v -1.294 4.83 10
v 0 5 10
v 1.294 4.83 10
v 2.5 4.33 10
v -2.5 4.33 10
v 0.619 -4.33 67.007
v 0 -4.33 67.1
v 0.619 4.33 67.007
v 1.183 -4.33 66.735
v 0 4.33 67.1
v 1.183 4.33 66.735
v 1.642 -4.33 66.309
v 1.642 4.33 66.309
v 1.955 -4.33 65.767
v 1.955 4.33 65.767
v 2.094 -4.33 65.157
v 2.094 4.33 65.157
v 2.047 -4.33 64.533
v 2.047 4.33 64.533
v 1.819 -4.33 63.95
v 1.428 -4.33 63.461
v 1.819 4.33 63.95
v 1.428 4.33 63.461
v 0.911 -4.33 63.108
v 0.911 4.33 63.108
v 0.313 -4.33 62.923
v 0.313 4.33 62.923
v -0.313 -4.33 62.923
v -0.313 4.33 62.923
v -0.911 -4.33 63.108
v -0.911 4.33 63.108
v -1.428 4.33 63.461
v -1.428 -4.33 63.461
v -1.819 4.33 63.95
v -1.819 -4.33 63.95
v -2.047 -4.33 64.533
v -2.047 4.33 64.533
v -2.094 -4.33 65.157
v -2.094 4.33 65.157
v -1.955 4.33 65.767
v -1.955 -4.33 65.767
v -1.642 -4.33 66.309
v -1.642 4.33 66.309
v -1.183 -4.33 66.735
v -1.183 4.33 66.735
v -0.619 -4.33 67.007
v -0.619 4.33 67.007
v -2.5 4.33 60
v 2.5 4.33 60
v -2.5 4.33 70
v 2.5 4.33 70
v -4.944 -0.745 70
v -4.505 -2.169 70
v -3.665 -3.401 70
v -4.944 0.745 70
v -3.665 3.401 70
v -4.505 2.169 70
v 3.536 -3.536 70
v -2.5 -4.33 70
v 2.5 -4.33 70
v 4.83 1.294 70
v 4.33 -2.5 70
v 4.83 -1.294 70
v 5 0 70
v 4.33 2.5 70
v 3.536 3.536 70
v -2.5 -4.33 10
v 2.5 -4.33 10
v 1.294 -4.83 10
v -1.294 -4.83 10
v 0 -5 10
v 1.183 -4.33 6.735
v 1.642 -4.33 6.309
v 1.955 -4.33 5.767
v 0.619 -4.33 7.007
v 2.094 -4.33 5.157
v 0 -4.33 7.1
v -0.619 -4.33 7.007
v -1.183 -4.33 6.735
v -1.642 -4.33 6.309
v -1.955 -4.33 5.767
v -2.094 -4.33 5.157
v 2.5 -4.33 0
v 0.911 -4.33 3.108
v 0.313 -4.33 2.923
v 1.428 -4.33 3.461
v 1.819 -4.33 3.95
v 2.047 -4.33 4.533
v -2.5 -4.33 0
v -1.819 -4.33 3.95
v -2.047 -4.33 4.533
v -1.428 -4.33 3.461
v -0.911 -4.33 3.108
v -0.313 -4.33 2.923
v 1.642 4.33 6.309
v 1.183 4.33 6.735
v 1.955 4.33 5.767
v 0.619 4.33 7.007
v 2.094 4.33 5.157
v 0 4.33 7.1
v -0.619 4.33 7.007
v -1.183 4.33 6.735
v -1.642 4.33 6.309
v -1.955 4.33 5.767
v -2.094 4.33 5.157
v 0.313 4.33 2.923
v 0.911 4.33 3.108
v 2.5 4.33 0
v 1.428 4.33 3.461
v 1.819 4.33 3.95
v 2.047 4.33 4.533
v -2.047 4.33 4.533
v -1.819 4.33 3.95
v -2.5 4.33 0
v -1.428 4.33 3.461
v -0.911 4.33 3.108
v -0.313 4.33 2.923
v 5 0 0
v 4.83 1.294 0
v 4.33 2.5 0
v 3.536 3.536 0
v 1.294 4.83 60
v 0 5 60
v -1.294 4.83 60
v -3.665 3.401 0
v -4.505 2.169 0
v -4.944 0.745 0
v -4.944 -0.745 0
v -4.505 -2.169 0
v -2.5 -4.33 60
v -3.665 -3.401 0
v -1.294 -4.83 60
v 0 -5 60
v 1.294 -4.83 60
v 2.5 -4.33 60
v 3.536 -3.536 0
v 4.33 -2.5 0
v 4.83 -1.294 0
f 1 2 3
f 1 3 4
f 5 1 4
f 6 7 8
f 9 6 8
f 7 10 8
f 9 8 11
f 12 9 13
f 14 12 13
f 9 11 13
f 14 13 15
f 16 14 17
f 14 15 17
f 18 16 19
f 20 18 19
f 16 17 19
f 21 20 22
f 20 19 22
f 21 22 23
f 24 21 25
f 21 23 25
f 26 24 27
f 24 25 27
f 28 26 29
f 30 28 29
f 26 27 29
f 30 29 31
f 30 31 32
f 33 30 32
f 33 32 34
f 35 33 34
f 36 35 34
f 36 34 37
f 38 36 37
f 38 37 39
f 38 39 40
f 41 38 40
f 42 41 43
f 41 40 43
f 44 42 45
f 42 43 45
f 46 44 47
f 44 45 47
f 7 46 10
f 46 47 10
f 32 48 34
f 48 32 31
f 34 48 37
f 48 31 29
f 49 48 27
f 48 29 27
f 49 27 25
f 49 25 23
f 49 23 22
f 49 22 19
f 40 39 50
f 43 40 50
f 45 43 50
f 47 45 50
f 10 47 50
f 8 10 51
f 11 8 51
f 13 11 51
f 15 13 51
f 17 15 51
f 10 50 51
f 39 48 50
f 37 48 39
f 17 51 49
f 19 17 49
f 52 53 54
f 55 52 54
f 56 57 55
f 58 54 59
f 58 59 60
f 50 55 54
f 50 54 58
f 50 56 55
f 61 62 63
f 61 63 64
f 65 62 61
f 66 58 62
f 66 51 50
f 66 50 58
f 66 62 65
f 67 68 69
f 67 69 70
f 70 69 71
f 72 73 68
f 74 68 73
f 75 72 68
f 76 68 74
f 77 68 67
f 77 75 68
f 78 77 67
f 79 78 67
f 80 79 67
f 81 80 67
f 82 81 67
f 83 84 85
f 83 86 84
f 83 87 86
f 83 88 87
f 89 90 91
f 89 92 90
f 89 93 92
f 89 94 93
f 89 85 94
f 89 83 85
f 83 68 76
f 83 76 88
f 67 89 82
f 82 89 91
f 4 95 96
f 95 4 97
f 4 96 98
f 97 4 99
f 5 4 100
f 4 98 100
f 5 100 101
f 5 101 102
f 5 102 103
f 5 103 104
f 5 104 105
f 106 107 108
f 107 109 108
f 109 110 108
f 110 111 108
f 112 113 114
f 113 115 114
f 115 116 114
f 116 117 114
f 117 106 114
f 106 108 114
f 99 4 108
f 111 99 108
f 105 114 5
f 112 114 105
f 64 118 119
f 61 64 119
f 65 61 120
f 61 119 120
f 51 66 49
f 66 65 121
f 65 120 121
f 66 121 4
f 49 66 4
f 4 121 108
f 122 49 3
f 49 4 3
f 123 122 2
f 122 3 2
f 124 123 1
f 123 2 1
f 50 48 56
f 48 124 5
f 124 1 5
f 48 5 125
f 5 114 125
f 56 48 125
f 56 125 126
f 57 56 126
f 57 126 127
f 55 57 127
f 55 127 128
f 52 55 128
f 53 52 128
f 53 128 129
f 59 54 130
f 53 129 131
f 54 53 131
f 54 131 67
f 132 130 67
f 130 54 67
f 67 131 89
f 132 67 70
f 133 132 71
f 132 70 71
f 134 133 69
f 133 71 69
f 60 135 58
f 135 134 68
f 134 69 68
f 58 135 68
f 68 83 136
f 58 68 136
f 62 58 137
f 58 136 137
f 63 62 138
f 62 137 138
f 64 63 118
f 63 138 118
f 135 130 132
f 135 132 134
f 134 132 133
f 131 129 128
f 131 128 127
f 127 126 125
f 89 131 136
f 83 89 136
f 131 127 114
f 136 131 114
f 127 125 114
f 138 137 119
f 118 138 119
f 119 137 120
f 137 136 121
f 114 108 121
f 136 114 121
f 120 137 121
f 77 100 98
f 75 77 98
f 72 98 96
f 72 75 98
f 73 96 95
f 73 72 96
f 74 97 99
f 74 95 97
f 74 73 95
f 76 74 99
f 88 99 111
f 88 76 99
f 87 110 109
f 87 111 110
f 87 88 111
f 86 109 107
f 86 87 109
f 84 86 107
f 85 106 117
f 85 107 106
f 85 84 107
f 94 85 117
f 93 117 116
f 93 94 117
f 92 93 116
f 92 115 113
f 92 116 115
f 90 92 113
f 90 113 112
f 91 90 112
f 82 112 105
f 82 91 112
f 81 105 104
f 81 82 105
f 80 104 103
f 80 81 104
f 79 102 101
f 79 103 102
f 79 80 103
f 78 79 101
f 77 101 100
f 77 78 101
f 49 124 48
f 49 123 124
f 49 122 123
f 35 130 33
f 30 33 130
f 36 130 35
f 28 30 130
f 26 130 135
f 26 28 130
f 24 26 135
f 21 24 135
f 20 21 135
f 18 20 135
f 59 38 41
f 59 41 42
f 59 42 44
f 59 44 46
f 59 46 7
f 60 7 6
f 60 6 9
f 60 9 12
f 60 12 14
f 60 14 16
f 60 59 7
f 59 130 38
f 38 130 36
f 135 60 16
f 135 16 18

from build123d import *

# Parameters (mm, degrees)
SKETCH_1_R          = 5
EXTRUDE_1_DEPTH     = 70
SKETCH_2_R          = 2.1
CUT_EXTRUDE_1_DEPTH = 5
SKETCH_3_W          = 5
SKETCH_3_H          = 10
CUT_EXTRUDE_2_DEPTH = 10
SKETCH_4_W          = 5
SKETCH_4_H          = 10
CUT_EXTRUDE_3_DEPTH = 10


with BuildPart() as part:
    # 草图1 → 凸台-拉伸1 (new body)
    with BuildSketch(Plane.XY):
        Circle(SKETCH_1_R)
    extrude(amount=EXTRUDE_1_DEPTH)

    # 草图2 → 切除-拉伸1 (cut, symmetric)
    with BuildSketch(Plane(origin=(0, 0, 0), x_dir=(1, 0, 0), z_dir=(0, 1, 0))):
        with Locations(Location((0, -5, 0), (0, 0, 270))):
            Circle(SKETCH_2_R)
        with Locations(Location((0, -65, 0), (0, 0, 270))):
            Circle(SKETCH_2_R)
    extrude(amount=CUT_EXTRUDE_1_DEPTH, both=True, mode=Mode.SUBTRACT)

    # 草图3 → 切除-拉伸2 (cut)
    with BuildSketch(Plane.XY.offset(70)):
        with Locations((0, 9.330127019)):
            Rectangle(SKETCH_3_W, SKETCH_3_H)
        with Locations((0, -9.330127019)):
            Rectangle(SKETCH_3_W, SKETCH_3_H)
    extrude(amount=-CUT_EXTRUDE_2_DEPTH, mode=Mode.SUBTRACT)

    # 草图4 → 切除-拉伸3 (cut)
    with BuildSketch(Plane(origin=(0, 0, 0), x_dir=(-1, 0, 0), z_dir=(0, 0, -1))):
        with Locations((0, 9.330127019)):
            Rectangle(SKETCH_4_W, SKETCH_4_H)
        with Locations((0, -9.330127019)):
            Rectangle(SKETCH_4_W, SKETCH_4_H)
    extrude(amount=-CUT_EXTRUDE_3_DEPTH, mode=Mode.SUBTRACT)


solid = part.part
